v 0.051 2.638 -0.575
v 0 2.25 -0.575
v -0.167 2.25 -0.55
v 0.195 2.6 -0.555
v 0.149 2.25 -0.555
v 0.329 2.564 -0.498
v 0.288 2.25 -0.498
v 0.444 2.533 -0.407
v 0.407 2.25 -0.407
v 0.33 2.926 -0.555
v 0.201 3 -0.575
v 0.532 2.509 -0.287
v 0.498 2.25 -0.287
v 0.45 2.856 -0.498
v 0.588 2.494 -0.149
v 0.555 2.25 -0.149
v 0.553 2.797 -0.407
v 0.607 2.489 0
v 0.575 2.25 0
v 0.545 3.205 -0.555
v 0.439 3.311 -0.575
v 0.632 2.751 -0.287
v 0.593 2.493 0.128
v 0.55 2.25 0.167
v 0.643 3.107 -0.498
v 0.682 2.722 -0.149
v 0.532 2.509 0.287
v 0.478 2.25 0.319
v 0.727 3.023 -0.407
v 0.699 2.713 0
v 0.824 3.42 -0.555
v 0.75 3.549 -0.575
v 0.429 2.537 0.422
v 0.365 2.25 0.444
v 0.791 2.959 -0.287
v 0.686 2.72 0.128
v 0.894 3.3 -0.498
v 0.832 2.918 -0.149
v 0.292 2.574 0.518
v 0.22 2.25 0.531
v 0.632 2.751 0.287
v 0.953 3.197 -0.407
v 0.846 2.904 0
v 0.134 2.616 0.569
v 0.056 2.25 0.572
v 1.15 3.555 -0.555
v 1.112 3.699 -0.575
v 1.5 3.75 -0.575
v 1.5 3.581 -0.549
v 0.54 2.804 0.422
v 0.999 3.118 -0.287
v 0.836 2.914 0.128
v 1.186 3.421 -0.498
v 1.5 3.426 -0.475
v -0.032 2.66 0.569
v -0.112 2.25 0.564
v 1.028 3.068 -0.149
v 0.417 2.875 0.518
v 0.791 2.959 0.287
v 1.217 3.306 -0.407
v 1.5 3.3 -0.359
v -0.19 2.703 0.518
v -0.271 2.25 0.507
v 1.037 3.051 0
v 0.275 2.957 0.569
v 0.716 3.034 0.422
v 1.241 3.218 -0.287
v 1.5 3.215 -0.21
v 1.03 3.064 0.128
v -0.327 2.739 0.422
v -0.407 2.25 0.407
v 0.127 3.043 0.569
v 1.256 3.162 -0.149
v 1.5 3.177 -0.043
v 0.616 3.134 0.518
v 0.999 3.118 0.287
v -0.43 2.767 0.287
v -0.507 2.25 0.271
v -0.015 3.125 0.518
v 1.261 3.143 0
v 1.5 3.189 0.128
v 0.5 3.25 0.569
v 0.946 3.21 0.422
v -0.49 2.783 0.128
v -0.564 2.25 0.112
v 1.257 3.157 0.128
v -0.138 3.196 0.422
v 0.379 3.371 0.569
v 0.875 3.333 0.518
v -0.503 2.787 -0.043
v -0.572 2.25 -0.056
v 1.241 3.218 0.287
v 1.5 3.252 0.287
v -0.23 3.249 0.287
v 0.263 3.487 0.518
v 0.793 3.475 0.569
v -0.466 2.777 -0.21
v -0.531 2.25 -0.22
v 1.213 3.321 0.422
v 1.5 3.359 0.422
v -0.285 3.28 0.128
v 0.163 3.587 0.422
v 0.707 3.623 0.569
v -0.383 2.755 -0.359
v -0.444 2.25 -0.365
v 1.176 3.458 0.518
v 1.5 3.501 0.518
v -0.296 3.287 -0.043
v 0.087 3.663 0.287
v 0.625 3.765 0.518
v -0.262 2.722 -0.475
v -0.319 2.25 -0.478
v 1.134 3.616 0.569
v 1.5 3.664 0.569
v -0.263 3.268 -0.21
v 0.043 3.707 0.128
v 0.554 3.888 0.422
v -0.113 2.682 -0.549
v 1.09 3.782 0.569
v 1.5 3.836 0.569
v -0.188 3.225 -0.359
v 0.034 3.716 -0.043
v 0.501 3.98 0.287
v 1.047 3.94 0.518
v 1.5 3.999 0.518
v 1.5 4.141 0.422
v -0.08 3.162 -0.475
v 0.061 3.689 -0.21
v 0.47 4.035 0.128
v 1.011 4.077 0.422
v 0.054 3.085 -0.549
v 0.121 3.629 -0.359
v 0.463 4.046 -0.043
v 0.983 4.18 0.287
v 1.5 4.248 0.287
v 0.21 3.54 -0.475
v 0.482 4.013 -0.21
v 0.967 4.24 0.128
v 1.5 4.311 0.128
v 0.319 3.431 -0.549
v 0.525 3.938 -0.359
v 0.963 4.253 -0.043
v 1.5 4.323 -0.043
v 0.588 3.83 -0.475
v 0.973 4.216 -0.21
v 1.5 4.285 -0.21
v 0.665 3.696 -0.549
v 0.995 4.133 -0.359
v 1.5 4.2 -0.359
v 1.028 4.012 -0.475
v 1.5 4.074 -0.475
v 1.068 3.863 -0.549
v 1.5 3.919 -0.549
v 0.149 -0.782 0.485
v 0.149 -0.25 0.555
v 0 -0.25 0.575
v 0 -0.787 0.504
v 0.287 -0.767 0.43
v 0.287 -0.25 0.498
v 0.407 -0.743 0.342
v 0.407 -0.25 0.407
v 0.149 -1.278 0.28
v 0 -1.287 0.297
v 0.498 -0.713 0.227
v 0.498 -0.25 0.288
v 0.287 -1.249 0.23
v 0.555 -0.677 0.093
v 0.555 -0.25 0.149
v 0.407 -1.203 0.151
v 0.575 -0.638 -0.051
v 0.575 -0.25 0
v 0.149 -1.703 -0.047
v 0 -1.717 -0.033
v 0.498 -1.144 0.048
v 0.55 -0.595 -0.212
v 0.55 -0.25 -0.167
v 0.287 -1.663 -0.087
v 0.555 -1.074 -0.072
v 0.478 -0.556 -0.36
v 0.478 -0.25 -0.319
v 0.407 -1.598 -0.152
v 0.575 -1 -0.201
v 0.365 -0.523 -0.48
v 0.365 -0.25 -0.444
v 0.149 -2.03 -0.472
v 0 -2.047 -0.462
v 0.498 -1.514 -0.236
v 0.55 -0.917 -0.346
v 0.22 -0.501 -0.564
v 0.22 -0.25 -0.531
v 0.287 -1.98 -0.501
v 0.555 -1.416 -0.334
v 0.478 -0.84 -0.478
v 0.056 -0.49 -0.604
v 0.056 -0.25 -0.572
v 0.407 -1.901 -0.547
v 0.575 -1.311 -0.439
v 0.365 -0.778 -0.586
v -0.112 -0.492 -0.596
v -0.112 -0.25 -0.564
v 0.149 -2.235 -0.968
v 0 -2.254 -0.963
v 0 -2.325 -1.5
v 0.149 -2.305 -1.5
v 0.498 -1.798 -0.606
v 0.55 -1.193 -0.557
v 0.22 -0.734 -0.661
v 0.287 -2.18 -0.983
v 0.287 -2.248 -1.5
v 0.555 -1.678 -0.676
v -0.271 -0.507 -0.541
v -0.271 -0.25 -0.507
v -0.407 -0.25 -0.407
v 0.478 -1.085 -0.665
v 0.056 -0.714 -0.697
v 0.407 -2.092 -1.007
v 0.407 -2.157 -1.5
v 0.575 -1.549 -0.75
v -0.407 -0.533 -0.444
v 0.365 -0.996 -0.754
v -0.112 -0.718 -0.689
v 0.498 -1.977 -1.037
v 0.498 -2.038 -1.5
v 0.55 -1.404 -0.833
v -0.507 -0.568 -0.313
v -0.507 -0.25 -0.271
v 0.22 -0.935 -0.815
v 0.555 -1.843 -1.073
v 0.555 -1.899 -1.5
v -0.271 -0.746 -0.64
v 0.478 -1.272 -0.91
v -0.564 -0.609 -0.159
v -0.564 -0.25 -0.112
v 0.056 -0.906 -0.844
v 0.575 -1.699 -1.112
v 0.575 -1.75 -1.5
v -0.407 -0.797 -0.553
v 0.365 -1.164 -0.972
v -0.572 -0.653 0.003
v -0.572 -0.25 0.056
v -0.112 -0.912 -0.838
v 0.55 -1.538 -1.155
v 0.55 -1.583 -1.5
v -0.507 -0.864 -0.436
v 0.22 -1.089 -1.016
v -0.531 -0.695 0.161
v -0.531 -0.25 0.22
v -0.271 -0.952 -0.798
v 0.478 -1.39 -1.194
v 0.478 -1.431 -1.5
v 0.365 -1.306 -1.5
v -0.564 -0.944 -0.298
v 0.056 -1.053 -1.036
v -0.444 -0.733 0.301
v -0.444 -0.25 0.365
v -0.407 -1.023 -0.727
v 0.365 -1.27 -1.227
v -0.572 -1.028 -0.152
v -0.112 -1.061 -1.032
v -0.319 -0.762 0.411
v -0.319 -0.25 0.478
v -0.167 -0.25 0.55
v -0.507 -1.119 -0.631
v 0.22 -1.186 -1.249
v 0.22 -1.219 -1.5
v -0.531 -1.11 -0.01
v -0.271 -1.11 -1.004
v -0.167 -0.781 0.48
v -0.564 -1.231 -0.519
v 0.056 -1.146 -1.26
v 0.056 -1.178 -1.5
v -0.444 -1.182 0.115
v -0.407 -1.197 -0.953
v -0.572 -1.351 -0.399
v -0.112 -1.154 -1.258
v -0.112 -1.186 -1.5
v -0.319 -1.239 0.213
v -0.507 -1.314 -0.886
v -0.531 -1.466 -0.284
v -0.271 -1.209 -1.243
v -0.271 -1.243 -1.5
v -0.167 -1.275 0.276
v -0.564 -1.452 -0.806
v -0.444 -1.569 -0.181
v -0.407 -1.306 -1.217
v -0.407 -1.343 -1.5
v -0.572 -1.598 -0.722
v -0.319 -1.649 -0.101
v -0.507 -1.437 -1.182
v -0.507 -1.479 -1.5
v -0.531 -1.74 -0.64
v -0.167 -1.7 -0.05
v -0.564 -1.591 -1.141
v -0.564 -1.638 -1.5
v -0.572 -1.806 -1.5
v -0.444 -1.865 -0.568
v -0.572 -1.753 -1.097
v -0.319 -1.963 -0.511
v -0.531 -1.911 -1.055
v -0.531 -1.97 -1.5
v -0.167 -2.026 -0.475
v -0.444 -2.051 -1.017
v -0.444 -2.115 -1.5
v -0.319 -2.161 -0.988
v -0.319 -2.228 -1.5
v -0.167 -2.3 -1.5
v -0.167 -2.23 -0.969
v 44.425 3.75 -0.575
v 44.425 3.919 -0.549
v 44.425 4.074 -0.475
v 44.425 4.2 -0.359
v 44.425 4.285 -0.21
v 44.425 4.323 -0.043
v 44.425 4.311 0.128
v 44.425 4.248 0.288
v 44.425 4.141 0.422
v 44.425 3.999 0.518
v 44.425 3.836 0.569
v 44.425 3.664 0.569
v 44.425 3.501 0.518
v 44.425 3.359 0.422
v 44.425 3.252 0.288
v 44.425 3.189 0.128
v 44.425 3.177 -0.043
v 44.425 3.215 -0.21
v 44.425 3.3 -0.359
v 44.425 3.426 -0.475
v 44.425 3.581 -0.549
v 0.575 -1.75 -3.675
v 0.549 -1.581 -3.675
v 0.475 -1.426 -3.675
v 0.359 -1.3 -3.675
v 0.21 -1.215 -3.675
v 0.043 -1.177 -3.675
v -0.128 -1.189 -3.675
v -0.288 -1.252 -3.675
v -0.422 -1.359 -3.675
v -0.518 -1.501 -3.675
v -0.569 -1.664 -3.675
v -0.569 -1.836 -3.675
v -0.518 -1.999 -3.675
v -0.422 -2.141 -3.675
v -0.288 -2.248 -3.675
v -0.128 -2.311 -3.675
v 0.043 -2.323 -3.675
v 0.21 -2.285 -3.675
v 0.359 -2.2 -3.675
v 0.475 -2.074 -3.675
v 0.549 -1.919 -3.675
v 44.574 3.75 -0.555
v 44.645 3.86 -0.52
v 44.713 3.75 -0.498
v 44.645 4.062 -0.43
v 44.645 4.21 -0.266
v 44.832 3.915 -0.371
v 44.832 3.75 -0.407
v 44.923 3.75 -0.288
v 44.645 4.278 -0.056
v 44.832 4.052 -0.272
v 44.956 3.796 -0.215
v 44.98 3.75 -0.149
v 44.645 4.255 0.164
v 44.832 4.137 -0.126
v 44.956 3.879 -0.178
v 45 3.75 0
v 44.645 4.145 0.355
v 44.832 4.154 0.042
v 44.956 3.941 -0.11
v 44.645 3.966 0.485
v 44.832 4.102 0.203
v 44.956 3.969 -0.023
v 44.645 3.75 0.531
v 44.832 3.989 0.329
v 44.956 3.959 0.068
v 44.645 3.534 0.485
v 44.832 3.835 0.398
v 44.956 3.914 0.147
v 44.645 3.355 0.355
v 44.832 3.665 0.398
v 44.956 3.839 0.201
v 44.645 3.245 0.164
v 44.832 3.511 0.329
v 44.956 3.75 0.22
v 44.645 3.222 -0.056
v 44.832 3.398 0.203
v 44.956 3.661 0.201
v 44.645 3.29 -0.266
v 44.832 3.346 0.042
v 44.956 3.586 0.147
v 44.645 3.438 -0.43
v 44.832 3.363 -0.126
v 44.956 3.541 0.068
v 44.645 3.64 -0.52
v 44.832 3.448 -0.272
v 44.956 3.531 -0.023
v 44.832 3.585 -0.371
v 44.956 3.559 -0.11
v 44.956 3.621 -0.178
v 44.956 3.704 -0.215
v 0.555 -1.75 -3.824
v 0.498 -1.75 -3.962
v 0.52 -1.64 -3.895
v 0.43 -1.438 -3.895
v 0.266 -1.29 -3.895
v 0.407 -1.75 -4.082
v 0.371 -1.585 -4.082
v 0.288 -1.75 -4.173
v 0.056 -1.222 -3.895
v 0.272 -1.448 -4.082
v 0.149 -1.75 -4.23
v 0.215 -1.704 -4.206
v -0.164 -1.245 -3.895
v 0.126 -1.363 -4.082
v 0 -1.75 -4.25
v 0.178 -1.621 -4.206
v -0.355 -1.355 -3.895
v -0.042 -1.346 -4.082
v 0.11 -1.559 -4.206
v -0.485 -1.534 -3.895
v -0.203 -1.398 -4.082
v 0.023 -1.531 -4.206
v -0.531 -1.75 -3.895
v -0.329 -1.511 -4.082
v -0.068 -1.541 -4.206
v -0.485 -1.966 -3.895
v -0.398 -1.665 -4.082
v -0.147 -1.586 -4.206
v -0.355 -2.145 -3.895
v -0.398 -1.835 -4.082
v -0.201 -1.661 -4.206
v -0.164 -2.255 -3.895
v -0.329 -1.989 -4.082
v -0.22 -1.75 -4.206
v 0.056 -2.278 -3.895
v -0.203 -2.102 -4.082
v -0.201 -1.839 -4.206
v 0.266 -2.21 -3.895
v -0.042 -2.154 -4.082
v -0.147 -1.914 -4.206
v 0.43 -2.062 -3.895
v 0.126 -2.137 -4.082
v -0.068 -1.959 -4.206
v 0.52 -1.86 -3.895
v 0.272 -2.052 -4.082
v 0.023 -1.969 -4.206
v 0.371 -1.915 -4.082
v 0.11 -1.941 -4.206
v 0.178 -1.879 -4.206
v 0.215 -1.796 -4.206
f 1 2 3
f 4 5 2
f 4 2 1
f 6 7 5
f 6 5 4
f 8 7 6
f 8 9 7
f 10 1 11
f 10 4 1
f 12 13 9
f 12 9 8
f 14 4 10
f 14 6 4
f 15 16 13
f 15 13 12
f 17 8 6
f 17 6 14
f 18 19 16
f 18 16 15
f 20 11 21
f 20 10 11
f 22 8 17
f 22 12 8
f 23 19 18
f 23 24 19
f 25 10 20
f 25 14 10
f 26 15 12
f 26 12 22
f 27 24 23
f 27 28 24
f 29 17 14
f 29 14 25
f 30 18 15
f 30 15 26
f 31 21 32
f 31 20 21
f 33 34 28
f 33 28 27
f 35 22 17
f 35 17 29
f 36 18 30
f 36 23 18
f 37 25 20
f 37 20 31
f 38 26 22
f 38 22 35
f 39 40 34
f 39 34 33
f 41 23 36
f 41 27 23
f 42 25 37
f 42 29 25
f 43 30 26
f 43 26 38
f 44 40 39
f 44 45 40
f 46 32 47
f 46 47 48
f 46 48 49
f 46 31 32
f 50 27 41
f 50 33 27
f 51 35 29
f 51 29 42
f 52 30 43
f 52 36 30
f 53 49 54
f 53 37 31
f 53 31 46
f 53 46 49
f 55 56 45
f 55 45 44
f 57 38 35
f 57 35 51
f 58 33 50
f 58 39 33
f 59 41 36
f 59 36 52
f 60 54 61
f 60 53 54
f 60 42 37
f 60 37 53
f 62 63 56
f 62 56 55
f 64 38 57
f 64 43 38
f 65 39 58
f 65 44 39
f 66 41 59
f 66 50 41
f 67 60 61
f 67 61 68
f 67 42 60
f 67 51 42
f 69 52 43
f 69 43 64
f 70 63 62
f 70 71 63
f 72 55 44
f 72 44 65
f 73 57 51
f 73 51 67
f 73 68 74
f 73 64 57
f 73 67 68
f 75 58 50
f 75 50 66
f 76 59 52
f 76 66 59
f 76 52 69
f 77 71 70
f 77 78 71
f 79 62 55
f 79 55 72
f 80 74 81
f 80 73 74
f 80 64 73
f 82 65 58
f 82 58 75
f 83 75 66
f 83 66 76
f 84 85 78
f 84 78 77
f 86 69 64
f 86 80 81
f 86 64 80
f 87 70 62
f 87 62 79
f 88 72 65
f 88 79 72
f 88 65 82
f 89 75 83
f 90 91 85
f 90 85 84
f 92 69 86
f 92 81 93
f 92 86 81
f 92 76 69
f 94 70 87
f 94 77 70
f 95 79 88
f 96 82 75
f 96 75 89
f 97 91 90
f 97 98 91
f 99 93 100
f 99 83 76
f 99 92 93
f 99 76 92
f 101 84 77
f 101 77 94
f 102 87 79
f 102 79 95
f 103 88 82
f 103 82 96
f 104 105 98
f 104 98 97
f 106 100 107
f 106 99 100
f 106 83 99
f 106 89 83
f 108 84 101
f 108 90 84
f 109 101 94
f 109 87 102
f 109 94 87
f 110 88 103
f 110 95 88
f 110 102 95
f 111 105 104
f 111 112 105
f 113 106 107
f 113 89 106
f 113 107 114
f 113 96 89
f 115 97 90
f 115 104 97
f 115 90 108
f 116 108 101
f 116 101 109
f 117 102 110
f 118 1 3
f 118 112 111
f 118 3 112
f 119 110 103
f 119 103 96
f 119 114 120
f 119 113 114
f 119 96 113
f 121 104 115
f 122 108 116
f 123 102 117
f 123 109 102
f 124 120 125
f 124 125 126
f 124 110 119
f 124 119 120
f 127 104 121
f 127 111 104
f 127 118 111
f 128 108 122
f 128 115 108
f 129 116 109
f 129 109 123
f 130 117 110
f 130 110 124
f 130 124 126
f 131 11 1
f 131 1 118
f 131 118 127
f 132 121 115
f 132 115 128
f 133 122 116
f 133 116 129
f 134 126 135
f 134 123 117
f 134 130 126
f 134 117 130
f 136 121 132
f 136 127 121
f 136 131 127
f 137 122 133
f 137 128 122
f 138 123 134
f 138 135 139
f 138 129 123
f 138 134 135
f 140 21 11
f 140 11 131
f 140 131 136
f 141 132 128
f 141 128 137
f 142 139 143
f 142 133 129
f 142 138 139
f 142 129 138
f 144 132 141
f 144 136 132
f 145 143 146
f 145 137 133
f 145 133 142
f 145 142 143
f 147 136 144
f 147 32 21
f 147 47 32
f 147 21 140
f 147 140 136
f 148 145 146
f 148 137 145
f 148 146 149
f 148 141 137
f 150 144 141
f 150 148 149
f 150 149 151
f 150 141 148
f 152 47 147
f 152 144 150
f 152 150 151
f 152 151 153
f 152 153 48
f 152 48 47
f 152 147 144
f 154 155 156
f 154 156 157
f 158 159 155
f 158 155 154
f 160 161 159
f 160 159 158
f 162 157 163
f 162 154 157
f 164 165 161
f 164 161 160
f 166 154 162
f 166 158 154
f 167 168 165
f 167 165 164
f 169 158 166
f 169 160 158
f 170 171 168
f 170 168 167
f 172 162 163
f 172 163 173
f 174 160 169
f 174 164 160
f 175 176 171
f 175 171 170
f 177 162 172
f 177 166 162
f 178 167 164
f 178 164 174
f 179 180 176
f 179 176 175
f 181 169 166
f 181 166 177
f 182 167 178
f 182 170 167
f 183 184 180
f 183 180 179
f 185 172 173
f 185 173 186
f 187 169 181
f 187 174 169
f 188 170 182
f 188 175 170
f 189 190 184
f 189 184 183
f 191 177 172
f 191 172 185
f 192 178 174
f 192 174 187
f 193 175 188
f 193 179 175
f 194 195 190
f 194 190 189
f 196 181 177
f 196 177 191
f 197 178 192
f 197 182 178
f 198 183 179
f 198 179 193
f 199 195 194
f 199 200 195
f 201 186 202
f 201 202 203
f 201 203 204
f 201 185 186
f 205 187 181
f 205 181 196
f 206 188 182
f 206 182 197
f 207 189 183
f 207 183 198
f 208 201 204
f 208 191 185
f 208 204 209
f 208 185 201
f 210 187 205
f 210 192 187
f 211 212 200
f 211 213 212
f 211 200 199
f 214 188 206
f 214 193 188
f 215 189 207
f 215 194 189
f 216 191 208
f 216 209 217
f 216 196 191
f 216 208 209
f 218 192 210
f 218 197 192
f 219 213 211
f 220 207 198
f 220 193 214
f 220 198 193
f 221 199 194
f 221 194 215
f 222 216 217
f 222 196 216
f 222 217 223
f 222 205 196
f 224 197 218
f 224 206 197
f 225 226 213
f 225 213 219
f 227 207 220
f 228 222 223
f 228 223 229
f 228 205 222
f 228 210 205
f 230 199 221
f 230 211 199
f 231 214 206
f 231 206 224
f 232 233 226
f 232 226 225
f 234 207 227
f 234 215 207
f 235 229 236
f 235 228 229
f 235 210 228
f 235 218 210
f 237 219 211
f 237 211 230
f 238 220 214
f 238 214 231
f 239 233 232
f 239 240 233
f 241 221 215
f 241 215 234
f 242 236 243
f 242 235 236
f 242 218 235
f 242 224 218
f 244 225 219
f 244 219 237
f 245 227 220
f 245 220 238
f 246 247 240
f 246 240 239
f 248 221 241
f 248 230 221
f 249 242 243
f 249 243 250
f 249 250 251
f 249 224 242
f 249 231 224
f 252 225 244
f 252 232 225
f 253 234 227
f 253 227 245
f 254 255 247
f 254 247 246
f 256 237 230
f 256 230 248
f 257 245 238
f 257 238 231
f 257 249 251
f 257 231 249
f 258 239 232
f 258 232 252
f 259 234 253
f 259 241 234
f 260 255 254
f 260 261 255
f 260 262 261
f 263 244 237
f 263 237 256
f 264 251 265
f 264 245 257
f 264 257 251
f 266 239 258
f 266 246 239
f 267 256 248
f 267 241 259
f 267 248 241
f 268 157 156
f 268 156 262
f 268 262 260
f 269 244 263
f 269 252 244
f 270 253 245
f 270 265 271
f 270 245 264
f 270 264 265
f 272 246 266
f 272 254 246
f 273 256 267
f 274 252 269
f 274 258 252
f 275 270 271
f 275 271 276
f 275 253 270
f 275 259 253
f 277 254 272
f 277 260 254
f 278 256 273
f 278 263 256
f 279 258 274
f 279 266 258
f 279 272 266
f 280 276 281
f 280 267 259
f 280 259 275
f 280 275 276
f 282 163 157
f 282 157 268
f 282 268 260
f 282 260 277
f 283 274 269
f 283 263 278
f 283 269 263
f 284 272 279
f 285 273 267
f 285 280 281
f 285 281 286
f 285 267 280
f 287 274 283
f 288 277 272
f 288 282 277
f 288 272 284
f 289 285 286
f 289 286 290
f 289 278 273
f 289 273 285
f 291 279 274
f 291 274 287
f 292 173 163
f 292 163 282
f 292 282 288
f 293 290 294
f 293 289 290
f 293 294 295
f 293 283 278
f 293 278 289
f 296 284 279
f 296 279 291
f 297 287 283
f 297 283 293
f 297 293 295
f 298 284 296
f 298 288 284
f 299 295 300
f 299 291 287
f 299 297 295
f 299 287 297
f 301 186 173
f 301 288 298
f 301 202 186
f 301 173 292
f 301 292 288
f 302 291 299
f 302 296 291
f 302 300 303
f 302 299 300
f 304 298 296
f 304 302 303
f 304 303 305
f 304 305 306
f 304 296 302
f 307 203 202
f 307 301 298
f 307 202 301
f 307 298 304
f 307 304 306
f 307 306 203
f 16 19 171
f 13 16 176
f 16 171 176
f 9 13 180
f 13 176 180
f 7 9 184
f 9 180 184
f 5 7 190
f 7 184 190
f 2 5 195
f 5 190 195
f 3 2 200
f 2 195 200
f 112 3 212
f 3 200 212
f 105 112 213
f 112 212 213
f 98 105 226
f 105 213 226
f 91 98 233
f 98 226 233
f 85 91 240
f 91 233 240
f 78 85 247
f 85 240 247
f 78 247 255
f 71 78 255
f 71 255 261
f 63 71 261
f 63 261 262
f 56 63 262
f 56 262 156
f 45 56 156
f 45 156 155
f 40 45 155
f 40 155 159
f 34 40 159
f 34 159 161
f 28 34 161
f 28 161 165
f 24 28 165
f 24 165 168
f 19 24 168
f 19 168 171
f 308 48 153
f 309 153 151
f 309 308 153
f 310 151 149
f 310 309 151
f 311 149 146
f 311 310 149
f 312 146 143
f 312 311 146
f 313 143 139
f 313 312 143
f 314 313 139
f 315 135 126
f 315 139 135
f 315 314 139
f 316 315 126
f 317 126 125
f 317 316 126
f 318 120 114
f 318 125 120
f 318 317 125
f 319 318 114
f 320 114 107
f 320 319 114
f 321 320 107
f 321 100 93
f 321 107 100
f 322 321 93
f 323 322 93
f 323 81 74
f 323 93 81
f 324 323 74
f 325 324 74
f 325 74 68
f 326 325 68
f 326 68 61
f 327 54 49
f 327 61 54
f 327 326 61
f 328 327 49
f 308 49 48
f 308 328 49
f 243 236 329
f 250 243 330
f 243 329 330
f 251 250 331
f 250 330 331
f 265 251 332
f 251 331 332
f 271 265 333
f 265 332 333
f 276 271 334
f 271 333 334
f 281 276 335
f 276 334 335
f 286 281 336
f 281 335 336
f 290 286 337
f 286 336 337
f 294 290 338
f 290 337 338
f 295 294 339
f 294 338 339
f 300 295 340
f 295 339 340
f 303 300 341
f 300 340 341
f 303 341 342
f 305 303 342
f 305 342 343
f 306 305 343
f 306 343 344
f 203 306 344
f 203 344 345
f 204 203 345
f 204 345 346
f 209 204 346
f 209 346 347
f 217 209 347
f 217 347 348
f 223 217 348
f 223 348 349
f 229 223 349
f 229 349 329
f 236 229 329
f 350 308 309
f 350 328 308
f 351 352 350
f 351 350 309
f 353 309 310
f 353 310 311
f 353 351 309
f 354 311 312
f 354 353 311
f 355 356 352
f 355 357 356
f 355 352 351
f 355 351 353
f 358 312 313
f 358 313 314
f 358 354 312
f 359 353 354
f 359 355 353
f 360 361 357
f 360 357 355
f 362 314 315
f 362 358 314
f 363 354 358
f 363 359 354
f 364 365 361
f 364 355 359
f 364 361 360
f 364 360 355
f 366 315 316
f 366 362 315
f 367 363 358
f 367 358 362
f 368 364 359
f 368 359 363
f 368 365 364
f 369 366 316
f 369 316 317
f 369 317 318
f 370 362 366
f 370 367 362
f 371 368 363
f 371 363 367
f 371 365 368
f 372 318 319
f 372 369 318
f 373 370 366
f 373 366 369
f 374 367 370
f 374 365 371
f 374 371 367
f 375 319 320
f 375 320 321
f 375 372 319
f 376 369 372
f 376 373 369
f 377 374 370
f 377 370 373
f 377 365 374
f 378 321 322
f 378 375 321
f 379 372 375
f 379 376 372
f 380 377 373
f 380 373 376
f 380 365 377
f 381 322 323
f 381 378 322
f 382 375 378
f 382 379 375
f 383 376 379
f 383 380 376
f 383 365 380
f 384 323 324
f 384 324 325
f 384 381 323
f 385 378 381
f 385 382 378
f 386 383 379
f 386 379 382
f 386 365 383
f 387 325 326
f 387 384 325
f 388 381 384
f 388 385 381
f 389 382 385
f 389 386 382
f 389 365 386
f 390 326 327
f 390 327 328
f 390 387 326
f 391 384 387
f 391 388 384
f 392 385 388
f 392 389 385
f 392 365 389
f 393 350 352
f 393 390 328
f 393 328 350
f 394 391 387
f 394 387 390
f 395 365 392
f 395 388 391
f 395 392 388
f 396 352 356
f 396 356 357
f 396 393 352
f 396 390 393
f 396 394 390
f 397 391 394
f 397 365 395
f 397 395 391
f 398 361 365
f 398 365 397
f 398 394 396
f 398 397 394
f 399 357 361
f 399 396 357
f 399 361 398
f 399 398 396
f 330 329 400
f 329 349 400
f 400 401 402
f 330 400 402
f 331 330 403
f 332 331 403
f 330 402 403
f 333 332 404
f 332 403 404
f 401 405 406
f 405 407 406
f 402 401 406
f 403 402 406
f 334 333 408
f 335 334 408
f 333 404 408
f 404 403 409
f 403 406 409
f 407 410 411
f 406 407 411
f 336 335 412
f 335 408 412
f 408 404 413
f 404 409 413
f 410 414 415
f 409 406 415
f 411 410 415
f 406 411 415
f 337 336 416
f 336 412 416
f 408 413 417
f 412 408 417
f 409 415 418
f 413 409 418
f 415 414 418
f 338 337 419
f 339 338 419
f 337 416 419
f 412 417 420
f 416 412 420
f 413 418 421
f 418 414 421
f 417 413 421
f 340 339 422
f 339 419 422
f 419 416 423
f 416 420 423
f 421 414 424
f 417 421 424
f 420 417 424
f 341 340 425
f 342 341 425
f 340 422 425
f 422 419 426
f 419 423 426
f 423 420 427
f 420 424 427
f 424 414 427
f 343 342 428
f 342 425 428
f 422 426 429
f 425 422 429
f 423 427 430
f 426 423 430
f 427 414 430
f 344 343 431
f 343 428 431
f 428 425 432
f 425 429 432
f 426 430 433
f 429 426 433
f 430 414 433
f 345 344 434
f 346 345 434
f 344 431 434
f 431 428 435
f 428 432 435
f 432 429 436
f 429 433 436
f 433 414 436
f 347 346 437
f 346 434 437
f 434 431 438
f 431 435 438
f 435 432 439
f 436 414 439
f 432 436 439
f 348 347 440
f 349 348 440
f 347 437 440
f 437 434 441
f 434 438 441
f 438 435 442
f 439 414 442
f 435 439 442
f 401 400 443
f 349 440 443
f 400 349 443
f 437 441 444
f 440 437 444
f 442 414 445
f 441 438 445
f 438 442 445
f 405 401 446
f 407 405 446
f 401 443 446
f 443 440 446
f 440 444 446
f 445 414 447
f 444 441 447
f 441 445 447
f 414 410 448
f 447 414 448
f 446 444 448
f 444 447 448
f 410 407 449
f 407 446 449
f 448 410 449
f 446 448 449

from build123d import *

# Parameters (mm, degrees)
SKICA4_R                       = 0.575
T_HNOUT_PO_K_IVCE2_OUTLINE_R   = 0.575
T_HNOUT_PO_K_IVCE2_ANGLE       = 90
T_HNOUT_START                  = -0.2500001
T_HNOUT_PO_K_IVCE2_2_OUTLINE_R = 0.575
T_HNOUT_PO_K_IVCE2_2_DEPTH     = 2.5000002
T_HNOUT_START_2                = -4.25
T_HNOUT_PO_K_IVCE2_3_OUTLINE_R = 0.575
T_HNOUT_PO_K_IVCE2_3_DEPTH     = 2.7500001
ZAOBLIT1_R                     = 0.575


with BuildPart() as part:
    # Táhnout po křivce1: sweep along a path in Skica1
    with BuildLine(Plane.XY) as t_hnout_po_k_ivce1_path:
        Line((0, 0), (0, 2.25))
        ThreePointArc((0, 2.25), (0.439339828, 3.310660172), (1.5, 3.75))
        Line((1.5, 3.75), (45, 3.75))
    # Skica4 → Táhnout po křivce1 (sweep)
    with BuildSketch(Plane(origin=(45, 0, 0), x_dir=(0, 0, -1), z_dir=(1, 0, 0))):
        with Locations((0, 3.75)):
            Circle(SKICA4_R)
    sweep(path=t_hnout_po_k_ivce1_path.line)



with BuildPart() as body_2:
    # Táhnout po křivce2: read off the stored shape, not the designer's step
    # Táhnout po křivce2 outline → Táhnout po křivce2 (revolve)
    with BuildSketch(Plane(origin=(0, -0.25, -1.5), x_dir=(0, 0, 1), z_dir=(0, 1, 0))):
        with Locations((1.5, 0)):
            Circle(T_HNOUT_PO_K_IVCE2_OUTLINE_R)
    revolve(axis=Axis((0, -0.25, -1.5), (1, 0, 0)), revolution_arc=T_HNOUT_PO_K_IVCE2_ANGLE)


with BuildPart() as part_1:
    add(part.part)

    add(body_2.part)  # T_hnout po k_ivce2 2 merges body 2
    # T_hnout po k_ivce2 2 outline → T_hnout po k_ivce2 2 (add)
    with BuildSketch(Plane(origin=(0, 0, 0), x_dir=(1, 0, 0), z_dir=(0, 1, 0)).offset(T_HNOUT_START)):
        Circle(T_HNOUT_PO_K_IVCE2_2_OUTLINE_R)
    extrude(amount=T_HNOUT_PO_K_IVCE2_2_DEPTH)

    # T_hnout po k_ivce2 3 outline → T_hnout po k_ivce2 3 (add)
    with BuildSketch(Plane.XY.offset(T_HNOUT_START_2)):
        with Locations((0, -1.75)):
            Circle(T_HNOUT_PO_K_IVCE2_3_OUTLINE_R)
    extrude(amount=T_HNOUT_PO_K_IVCE2_3_DEPTH)

    # Zaoblit1
    zaoblit1_edges = [part_1.edges().sort_by_distance(p)[0] for p in [
        (45, 3.75, 0.575),
        (-0.575, -1.75, -4.25),
    ]]
    fillet(zaoblit1_edges, radius=ZAOBLIT1_R)


solid = part_1.part
